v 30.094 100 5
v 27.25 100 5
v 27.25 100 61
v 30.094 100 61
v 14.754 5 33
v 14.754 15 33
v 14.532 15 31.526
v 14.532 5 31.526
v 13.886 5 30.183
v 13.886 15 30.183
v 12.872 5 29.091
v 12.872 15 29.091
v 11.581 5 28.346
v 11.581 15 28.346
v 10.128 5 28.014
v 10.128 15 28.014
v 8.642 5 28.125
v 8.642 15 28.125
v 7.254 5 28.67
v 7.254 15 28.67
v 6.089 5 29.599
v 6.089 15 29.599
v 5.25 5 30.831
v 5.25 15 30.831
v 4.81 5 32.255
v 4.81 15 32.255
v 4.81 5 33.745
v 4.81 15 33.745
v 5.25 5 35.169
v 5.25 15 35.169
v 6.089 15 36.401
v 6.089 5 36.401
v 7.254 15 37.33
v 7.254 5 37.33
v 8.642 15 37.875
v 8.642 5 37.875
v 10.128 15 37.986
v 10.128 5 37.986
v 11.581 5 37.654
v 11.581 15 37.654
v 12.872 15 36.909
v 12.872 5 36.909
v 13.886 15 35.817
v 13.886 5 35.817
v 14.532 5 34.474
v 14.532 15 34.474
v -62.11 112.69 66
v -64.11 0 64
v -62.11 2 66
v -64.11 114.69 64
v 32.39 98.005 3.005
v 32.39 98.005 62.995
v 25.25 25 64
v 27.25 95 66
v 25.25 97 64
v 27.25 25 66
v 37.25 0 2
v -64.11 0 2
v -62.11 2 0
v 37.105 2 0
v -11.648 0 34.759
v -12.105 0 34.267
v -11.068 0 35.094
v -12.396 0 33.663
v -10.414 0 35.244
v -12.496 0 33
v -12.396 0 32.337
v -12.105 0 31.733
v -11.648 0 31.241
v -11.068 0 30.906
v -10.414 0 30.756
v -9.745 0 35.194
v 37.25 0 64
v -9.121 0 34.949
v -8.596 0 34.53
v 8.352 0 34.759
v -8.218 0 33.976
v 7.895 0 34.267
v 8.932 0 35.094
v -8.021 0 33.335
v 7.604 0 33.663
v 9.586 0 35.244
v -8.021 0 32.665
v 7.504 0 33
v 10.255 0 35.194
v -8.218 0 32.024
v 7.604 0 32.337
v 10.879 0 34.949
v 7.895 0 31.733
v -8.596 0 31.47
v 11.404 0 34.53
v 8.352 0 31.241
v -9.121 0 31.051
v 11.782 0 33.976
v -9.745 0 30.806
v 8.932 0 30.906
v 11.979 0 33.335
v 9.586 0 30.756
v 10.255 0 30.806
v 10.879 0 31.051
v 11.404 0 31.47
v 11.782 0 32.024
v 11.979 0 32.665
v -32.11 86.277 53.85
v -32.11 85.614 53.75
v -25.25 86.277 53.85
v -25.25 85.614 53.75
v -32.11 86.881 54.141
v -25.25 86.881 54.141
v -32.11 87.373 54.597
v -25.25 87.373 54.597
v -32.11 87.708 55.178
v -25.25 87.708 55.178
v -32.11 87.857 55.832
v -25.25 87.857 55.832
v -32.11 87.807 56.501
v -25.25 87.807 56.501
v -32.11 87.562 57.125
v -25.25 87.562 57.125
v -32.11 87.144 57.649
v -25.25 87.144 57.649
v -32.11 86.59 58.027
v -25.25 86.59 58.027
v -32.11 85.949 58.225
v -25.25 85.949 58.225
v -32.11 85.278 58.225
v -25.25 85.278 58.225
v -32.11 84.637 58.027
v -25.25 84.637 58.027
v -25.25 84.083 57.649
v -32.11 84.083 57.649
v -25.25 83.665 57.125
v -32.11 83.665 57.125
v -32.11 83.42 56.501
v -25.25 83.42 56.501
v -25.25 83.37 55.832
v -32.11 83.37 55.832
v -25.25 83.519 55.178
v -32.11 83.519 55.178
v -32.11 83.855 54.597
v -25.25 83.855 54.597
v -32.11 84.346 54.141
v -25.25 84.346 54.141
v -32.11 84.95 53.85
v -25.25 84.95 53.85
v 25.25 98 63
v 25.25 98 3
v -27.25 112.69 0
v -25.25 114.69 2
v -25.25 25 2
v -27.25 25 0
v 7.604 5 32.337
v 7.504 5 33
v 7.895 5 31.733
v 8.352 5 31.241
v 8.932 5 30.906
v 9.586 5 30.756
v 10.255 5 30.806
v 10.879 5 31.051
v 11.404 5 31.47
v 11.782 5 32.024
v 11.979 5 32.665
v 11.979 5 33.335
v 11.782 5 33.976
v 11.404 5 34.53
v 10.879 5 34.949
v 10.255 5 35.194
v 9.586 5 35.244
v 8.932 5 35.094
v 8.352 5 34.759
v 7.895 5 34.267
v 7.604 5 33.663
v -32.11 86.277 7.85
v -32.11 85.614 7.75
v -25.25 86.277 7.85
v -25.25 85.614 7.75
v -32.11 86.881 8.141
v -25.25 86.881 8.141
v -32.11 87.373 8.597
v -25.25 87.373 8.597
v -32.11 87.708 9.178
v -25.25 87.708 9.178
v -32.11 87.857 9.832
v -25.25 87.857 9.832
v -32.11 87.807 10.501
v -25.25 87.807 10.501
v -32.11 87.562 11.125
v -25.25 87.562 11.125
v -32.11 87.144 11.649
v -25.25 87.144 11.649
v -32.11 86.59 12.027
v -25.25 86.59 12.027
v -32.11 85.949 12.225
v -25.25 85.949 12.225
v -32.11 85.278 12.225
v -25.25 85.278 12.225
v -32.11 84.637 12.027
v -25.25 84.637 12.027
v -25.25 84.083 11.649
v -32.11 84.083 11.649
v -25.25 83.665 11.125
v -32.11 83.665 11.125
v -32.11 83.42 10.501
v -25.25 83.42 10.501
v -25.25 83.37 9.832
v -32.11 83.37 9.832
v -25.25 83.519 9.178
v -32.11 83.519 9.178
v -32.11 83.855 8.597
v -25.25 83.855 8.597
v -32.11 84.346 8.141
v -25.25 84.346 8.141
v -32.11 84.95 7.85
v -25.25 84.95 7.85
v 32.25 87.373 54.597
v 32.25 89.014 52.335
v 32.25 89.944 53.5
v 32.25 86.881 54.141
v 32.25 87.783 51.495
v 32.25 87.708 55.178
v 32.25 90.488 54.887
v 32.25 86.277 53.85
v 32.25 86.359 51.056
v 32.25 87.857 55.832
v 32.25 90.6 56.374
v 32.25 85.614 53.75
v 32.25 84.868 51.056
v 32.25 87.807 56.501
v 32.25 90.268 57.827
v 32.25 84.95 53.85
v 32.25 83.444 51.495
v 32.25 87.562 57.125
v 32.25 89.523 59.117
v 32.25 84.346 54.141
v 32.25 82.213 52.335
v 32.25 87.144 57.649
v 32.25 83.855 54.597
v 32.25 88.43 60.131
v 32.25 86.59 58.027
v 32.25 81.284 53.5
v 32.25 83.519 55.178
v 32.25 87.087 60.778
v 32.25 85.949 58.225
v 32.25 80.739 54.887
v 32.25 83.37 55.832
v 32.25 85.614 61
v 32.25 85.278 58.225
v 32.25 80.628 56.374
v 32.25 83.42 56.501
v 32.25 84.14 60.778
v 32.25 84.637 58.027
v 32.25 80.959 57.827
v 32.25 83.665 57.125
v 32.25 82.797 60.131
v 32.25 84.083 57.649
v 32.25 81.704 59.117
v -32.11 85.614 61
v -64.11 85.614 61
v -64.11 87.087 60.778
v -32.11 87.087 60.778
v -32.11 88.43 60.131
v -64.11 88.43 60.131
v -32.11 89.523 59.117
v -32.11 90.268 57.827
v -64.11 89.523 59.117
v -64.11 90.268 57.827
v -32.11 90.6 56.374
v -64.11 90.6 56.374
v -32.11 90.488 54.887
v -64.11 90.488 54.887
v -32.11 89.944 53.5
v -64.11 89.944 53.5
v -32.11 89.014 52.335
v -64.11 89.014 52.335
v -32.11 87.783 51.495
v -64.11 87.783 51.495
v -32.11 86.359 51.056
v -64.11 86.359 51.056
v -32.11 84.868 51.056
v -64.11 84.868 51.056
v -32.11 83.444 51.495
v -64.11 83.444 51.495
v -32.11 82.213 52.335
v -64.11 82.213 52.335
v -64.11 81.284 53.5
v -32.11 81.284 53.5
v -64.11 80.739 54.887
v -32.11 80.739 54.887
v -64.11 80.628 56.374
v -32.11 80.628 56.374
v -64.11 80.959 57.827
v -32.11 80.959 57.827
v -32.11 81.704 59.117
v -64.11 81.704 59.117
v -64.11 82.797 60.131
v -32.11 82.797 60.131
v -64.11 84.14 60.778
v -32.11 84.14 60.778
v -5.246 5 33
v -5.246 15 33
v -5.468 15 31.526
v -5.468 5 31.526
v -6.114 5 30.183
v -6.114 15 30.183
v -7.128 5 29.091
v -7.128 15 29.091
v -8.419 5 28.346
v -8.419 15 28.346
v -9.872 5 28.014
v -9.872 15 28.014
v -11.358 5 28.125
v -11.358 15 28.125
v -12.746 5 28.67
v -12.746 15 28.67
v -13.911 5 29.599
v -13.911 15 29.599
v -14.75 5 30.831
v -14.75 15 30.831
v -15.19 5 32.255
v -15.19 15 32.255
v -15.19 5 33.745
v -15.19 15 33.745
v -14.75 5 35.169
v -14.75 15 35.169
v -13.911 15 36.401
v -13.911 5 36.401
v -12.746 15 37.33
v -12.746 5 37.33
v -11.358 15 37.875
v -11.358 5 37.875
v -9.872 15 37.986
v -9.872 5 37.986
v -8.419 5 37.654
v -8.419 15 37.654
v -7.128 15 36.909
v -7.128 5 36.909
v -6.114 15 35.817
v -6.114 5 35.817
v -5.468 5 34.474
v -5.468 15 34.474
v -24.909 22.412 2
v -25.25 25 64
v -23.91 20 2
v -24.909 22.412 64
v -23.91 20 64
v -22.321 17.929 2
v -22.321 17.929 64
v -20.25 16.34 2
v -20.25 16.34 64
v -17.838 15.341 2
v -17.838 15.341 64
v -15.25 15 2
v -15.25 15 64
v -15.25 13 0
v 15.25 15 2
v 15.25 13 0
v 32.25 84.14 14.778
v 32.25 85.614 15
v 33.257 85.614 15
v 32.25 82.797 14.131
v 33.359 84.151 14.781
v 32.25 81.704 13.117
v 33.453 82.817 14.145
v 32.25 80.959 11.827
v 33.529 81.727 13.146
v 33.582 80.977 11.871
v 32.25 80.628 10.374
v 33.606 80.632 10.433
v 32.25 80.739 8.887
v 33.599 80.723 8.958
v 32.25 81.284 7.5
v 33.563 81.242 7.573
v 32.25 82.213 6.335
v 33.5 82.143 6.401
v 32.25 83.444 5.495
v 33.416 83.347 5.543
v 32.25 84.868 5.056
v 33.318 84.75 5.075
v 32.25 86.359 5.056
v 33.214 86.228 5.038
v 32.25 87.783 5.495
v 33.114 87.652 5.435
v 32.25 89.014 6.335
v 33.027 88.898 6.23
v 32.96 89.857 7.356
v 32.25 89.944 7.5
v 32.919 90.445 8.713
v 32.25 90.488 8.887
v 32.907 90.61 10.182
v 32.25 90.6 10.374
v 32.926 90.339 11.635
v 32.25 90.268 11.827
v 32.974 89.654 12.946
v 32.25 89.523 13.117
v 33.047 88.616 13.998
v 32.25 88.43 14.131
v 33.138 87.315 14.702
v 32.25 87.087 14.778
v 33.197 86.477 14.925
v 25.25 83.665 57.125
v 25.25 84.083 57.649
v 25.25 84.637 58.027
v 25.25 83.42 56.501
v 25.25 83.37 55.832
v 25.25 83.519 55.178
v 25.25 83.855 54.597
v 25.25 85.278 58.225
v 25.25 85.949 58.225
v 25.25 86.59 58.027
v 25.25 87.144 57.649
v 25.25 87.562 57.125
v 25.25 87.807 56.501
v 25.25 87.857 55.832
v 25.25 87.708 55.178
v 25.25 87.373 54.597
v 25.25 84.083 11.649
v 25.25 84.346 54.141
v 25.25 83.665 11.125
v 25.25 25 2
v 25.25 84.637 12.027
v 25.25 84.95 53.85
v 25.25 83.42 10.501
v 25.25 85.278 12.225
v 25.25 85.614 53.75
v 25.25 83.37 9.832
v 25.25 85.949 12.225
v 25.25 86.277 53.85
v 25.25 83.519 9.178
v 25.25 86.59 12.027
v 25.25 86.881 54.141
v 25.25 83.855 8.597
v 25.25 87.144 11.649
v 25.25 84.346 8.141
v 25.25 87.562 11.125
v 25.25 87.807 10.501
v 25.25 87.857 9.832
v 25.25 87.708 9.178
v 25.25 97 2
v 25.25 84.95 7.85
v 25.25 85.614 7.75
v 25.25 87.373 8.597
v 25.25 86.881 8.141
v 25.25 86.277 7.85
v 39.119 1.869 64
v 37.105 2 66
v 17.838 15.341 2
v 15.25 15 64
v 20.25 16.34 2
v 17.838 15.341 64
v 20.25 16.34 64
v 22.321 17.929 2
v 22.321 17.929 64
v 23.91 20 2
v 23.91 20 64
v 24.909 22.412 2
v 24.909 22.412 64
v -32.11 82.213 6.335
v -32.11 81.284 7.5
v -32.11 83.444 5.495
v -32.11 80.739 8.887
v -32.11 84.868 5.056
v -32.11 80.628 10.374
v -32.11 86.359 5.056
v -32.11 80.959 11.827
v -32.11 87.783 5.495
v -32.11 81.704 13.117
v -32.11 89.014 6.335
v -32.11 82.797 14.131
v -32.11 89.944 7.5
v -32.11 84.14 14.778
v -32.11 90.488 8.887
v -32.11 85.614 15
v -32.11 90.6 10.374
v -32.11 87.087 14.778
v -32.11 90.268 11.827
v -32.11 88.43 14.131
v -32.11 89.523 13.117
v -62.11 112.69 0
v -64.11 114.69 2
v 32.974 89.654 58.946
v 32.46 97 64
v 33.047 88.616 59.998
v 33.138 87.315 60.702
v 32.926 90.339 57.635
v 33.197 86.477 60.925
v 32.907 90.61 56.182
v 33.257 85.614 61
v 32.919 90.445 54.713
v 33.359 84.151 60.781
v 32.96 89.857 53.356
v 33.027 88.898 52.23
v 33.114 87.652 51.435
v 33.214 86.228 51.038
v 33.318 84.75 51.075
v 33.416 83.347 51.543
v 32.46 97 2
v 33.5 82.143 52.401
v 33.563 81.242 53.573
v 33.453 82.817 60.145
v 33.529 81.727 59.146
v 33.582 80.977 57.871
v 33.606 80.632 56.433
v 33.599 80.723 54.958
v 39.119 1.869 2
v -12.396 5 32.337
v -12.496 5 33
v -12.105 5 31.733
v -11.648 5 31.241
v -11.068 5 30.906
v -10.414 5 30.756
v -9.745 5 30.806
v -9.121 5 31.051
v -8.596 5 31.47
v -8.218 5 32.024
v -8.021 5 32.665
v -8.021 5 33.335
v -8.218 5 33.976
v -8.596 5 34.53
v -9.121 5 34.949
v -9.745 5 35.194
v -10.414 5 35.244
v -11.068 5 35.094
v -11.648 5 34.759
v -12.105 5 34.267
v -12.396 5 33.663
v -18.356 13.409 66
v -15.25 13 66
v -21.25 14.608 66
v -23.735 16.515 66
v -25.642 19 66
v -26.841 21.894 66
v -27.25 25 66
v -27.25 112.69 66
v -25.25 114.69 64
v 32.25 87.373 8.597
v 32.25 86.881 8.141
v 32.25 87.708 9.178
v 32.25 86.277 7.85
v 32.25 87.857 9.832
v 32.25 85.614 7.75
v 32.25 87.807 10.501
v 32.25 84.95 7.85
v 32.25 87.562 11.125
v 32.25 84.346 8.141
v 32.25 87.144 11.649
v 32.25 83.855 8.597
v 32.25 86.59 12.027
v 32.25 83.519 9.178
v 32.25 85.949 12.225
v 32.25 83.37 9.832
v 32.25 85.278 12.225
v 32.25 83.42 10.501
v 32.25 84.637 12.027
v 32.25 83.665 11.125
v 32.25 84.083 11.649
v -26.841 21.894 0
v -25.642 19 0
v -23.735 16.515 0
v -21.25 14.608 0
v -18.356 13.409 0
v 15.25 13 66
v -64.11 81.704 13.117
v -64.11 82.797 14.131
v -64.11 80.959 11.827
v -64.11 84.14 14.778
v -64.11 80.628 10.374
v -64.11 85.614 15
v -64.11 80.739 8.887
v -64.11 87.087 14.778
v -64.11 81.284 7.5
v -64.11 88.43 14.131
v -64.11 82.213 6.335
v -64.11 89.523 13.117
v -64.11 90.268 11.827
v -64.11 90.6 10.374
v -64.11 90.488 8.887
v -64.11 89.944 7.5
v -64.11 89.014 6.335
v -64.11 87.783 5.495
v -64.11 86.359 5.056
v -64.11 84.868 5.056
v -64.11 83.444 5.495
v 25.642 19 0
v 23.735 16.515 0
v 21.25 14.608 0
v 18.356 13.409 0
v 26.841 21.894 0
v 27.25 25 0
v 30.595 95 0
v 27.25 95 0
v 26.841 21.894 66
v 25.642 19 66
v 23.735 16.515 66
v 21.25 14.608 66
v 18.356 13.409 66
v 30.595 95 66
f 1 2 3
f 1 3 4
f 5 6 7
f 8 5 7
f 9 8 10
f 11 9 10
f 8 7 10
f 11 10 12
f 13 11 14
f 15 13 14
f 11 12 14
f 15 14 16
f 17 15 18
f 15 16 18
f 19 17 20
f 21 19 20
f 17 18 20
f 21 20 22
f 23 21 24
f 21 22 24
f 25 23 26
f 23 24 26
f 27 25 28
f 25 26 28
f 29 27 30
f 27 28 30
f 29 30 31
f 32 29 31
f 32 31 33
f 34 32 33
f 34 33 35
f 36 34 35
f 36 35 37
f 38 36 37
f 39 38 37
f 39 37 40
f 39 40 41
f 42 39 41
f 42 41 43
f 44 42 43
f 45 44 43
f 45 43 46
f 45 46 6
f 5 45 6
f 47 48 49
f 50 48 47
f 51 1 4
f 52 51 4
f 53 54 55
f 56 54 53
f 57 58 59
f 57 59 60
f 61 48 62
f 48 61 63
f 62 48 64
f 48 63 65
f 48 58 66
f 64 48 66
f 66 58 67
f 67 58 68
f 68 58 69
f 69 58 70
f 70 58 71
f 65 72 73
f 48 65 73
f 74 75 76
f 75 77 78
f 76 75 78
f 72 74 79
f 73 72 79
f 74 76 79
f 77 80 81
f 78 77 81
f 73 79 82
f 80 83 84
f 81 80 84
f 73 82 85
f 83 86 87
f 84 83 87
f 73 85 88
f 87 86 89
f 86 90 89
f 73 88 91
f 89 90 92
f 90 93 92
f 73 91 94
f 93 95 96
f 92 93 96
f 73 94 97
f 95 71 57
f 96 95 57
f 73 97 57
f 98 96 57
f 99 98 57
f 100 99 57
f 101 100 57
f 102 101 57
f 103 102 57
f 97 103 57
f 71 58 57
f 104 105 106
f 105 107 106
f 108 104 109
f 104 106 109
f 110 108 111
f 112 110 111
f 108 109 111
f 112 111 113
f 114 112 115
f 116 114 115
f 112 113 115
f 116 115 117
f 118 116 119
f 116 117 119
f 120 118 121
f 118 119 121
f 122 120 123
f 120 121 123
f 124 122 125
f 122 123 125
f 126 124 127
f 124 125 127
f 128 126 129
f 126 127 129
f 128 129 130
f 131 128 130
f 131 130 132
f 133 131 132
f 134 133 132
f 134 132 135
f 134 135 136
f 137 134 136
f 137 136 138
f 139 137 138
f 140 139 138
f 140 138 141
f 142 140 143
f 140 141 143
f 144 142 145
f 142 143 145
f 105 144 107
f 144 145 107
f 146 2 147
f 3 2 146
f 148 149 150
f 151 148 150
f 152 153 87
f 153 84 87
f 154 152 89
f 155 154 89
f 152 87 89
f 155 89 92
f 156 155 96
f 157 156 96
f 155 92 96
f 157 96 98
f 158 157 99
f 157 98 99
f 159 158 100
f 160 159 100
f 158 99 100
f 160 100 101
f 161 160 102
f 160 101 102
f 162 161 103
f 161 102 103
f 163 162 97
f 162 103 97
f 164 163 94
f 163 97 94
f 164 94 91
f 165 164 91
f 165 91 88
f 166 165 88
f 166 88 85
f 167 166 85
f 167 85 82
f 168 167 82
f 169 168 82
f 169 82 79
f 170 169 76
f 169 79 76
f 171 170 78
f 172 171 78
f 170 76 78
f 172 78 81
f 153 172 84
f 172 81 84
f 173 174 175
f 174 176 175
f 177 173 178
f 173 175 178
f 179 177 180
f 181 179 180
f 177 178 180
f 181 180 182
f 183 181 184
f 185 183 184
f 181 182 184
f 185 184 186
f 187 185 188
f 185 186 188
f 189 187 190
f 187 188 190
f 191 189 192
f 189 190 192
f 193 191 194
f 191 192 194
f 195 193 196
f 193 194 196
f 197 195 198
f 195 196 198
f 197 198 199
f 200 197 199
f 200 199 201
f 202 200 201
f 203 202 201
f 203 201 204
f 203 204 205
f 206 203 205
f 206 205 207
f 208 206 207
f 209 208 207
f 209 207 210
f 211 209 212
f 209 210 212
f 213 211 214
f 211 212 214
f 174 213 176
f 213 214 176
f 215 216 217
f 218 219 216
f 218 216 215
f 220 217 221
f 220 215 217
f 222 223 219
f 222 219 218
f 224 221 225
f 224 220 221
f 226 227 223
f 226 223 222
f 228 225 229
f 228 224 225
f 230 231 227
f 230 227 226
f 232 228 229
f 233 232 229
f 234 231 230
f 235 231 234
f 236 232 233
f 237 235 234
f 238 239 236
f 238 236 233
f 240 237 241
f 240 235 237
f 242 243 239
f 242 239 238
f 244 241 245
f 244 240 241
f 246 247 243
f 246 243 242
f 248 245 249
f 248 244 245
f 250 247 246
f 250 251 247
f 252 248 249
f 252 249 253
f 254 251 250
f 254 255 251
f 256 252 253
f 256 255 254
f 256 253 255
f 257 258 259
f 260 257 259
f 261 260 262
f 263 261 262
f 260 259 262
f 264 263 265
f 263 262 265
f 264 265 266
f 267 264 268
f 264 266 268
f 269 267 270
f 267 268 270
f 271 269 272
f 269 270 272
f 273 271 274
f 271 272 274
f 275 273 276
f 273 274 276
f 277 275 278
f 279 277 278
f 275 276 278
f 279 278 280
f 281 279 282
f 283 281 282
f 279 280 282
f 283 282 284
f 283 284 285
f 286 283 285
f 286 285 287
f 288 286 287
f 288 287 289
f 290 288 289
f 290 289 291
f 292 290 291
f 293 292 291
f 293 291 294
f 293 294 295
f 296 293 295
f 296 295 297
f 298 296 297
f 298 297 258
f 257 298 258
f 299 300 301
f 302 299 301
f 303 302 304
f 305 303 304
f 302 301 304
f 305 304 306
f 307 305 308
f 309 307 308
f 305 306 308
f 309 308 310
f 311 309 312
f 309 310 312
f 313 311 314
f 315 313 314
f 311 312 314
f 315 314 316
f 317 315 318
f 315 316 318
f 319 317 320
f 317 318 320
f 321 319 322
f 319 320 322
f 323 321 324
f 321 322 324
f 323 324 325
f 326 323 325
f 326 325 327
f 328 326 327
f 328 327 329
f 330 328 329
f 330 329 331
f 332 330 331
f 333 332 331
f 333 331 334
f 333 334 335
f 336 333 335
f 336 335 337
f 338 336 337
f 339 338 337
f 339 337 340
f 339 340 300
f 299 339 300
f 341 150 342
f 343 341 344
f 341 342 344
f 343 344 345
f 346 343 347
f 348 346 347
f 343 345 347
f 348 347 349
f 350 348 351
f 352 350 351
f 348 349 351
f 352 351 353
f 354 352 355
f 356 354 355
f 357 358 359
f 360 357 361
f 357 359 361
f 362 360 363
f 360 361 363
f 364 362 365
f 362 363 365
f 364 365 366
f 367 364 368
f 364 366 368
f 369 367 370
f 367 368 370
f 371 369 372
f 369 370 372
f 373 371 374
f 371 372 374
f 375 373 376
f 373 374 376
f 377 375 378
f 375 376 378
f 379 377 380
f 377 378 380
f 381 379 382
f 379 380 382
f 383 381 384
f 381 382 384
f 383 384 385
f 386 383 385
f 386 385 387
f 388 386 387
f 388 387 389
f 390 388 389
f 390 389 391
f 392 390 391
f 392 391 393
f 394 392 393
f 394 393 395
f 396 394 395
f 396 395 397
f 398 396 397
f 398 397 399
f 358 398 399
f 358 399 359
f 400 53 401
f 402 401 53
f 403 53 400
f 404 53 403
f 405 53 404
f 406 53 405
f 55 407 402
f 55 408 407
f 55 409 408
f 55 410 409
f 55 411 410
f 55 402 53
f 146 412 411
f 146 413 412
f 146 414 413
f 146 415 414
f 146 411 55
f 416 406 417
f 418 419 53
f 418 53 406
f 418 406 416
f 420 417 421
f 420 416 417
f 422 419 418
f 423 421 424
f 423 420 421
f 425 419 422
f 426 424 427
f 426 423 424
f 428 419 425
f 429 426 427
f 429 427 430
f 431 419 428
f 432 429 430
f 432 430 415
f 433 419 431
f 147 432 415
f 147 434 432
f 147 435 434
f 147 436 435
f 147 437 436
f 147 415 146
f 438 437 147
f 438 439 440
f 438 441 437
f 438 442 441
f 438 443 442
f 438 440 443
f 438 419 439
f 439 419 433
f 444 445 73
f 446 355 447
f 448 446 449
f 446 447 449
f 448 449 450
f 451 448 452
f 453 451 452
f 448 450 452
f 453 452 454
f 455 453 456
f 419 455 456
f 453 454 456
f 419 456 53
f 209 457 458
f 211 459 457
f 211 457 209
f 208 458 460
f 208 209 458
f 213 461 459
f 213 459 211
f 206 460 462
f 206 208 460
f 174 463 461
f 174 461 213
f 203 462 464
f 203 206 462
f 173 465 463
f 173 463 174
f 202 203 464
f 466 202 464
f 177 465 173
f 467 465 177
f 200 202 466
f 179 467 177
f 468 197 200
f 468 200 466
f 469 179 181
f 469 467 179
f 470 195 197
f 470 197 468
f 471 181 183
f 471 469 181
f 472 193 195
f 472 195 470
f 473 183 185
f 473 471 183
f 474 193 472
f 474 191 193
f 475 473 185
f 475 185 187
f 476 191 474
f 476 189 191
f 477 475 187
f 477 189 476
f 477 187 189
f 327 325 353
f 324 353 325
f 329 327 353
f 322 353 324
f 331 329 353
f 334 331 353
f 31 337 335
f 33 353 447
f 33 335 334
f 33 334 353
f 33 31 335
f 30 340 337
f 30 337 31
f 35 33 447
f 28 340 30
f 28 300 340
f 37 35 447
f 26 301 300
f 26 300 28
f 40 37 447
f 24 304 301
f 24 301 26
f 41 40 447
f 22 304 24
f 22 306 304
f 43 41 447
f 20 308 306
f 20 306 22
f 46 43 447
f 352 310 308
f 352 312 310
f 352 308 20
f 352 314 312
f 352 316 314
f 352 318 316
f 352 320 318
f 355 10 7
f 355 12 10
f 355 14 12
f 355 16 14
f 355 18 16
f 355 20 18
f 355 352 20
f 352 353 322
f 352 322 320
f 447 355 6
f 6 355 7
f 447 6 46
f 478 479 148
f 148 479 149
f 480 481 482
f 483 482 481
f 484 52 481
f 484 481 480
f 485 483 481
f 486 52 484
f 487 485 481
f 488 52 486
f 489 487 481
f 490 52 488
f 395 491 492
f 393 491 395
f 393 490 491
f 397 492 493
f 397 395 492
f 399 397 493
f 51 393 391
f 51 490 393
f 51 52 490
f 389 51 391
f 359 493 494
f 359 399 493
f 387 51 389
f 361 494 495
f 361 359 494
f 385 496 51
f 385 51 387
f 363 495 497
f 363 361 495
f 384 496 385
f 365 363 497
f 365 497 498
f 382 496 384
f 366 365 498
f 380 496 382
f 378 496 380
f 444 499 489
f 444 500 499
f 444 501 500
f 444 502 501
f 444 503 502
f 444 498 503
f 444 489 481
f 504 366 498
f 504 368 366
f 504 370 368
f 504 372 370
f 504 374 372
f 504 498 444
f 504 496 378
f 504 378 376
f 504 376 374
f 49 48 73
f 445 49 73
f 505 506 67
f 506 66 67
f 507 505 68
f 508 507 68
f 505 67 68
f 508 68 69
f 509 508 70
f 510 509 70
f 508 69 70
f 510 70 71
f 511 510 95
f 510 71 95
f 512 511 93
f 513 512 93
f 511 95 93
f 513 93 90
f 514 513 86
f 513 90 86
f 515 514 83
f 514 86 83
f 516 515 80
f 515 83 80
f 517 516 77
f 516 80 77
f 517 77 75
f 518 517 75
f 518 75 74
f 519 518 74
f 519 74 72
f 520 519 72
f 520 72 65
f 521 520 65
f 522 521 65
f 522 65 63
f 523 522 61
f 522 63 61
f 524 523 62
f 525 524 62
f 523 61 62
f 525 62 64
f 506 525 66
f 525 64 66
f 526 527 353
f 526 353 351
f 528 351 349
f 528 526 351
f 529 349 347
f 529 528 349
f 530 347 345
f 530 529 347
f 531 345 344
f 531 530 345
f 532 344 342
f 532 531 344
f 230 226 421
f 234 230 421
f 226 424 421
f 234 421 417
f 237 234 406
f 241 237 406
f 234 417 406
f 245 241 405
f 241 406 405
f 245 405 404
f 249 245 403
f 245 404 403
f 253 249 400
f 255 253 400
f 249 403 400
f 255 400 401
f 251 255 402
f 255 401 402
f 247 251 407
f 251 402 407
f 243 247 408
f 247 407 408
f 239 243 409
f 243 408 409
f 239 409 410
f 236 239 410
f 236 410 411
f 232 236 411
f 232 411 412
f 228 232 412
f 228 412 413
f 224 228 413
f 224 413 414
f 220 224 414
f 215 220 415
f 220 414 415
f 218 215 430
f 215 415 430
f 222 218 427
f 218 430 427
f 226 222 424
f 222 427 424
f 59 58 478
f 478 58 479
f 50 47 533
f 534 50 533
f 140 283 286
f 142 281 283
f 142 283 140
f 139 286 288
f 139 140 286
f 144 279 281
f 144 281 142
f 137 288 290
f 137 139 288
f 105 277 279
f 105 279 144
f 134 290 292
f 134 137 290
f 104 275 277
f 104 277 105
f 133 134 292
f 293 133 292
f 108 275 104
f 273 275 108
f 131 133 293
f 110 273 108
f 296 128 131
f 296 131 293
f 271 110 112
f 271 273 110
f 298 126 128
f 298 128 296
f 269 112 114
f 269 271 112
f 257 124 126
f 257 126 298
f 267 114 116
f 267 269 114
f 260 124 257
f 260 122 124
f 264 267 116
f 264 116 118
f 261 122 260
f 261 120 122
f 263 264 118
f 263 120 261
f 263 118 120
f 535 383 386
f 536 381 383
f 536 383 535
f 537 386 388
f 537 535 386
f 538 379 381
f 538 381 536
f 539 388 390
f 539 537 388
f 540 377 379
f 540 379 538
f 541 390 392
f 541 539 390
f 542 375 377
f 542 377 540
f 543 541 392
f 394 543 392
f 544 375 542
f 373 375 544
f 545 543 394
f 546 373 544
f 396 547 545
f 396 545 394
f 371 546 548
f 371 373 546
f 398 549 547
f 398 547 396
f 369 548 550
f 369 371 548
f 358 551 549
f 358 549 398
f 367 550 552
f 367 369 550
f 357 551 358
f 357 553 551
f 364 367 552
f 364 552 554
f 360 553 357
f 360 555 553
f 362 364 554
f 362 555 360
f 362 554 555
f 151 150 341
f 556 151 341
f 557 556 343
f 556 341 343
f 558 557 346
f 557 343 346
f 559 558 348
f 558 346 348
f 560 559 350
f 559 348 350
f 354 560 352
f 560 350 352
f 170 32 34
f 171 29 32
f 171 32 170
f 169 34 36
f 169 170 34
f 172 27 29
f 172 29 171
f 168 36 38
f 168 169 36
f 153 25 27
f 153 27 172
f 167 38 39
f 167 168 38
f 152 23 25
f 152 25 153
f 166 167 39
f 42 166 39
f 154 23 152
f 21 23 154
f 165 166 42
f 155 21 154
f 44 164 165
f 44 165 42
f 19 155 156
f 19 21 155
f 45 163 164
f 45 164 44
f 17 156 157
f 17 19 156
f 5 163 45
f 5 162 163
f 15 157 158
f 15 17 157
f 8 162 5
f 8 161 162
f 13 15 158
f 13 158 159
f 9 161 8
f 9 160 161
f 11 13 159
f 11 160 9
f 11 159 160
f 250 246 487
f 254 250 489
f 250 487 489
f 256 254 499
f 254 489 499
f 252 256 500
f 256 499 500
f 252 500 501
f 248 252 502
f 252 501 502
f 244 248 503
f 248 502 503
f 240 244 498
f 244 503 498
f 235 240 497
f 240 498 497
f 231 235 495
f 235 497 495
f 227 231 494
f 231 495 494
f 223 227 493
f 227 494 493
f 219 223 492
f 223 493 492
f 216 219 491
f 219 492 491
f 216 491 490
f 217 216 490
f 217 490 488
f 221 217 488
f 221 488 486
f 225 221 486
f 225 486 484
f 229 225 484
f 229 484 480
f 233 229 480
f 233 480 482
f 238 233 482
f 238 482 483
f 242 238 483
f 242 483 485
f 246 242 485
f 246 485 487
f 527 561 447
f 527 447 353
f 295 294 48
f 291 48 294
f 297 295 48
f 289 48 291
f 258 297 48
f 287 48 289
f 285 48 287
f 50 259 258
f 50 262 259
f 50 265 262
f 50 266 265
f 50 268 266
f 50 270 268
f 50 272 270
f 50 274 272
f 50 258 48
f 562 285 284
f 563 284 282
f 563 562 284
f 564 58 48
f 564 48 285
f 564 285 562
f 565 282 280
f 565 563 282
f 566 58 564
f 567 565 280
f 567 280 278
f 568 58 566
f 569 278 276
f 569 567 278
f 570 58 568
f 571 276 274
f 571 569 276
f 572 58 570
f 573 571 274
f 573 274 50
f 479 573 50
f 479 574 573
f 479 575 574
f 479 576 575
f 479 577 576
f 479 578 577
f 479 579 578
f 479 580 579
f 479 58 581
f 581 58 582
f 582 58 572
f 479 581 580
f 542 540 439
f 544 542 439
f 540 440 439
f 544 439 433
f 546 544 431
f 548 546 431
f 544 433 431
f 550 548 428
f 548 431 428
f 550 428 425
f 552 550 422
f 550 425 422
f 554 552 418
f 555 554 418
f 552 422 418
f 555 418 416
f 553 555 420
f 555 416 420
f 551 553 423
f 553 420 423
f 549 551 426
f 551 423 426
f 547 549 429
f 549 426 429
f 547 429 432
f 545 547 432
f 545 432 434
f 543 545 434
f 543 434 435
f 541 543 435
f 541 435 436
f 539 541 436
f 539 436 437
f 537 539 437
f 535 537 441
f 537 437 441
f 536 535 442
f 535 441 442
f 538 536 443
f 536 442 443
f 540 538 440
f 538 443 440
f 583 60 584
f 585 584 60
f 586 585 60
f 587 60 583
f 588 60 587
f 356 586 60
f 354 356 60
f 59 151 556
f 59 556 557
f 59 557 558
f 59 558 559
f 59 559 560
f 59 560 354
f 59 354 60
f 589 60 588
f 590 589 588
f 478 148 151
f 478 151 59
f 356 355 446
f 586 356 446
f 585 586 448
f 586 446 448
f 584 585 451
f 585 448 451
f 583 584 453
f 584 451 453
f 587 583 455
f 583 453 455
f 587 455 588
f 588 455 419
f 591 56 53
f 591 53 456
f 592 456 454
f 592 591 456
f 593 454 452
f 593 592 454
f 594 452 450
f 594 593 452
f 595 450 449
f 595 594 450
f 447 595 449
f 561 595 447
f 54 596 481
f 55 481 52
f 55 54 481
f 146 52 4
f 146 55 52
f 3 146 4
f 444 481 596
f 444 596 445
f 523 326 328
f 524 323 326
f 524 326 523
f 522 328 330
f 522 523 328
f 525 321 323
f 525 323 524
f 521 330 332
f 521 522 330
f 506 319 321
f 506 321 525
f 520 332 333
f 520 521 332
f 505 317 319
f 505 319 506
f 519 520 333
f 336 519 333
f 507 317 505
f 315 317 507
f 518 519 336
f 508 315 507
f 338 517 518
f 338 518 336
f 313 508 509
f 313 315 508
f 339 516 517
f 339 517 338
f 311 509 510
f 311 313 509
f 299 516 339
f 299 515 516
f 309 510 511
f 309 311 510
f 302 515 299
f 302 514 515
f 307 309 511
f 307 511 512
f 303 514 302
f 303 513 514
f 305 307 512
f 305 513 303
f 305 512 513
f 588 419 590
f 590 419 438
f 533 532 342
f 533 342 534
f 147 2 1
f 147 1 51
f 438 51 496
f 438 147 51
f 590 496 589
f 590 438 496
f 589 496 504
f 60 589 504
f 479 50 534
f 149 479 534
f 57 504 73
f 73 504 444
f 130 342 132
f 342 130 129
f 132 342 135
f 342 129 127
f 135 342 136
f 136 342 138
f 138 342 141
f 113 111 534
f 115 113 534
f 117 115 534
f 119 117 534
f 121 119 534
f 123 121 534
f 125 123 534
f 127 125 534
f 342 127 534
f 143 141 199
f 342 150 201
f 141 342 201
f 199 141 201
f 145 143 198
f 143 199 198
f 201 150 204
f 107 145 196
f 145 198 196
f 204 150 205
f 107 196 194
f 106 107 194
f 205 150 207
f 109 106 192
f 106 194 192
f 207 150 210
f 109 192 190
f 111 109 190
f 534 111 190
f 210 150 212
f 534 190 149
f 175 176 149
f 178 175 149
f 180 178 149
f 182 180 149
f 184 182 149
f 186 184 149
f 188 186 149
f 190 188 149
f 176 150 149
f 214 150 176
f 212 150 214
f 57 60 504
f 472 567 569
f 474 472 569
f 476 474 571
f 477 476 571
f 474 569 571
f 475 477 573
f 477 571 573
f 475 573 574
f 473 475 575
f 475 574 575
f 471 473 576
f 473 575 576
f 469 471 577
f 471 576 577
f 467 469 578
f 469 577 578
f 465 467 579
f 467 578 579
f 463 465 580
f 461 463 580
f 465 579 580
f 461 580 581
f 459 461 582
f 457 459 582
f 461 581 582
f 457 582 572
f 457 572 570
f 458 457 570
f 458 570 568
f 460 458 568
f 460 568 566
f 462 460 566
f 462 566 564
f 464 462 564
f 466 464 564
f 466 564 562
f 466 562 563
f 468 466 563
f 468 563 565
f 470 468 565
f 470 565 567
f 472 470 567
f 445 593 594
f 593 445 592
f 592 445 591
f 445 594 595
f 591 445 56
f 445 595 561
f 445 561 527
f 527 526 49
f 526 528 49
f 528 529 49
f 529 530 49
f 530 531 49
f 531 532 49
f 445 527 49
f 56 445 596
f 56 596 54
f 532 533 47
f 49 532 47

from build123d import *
from OCP.BRepFilletAPI import BRepFilletAPI_MakeChamfer

# Parameters (mm, degrees)
ESTRUSIONE_ESTRUSIONE1_DEPTH                         = 66
RACCORDO1_R                                          = 10
SMUSSO1_SIZE                                         = 2
SMUSSO1_SIZE2                                        = 2.155800013
SMUSSO1_SIZE2_2                                      = 1.873732722
SMUSSO2_SIZE                                         = 5
FORO_LAMATO_PER_VITE_M4_A_TESTA_CILINDRI_D           = 4.5
FORO_LAMATO_PER_VITE_M4_A_TESTA_CILINDRI_DEPTH       = 30
FORO_LAMATO_PER_VITE_M4_A_TESTA_CILINDRI_CBORE_D     = 10
FORO_LAMATO_PER_VITE_M4_A_TESTA_CILINDRI_CBORE_DEPTH = 3
FORO_LAMATO_PER_VITE_M4_A_TESTA_CILINDRI_TIP         = 1.351936393
FORO_LAMATO_PER_VITE_M4_A_TESTA_CILI_2_D             = 4.5
FORO_LAMATO_PER_VITE_M4_A_TESTA_CILI_2_DEPTH         = 30
FORO_LAMATO_PER_VITE_M4_A_TESTA_CILI_2_CBORE_D       = 10
FORO_LAMATO_PER_VITE_M4_A_TESTA_CILI_2_CBORE_DEPTH   = 10
FORO_LAMATO_PER_VITE_M4_A_TESTA_CILI_2_TIP           = 1.351936393
FORO_LAMATO_PER_VITE_M4_A_TESTA_CILI_3_D             = 4.5
FORO_LAMATO_PER_VITE_M4_A_TESTA_CILI_3_DEPTH         = 45
FORO_LAMATO_PER_VITE_M4_A_TESTA_CILI_3_CBORE_D       = 10
FORO_LAMATO_PER_VITE_M4_A_TESTA_CILI_3_CBORE_DEPTH   = 32
FORO_LAMATO_PER_VITE_M4_A_TESTA_CILI_3_TIP           = 1.351936393


with BuildPart() as part:
    # Schizzo1 → Estrusione-Estrusione1 (new body)
    with BuildSketch(Plane.XY):
        Polygon((25.25, 100), (32.25, 100), (39.25, 0), (-39.25, 0), (-64.110342, 0), (-64.110342, 114.69), (-25.25, 114.69), (-25.25, 100), (-25.25, 15), (25.25, 15), align=None)
    extrude(amount=ESTRUSIONE_ESTRUSIONE1_DEPTH)

    # Raccordo1
    raccordo1_edges = [part.edges().sort_by_distance(p)[0] for p in [
        (-25.25, 15, 33),
        (25.25, 15, 33),
    ]]
    fillet(raccordo1_edges, radius=RACCORDO1_R)

    # Smusso1: one chamfer whose edges measure the first distance from different faces: ONE call of the kernel's chamfer builder (chamfer() names one face for all edges)
    smusso1_edges_1 = [part.edges().sort_by_distance(p)[0] for p in [
        (35.75, 50, 0),
        (-12.430171, 0, 0),
        (-64.110342, 57.345, 0),
        (-44.680171, 114.69, 0),
        (25.25, 62.5, 0),
        (25.25, 100, 33),
        (-44.680171, 114.69, 66),
        (-64.110342, 57.345, 66),
        (-12.430171, 0, 66),
        (-25.25, 69.845, 0),
        (-25.25, 69.845, 66),
        (0, 15, 0),
        (0, 15, 66),
        (-22.321067812, 17.928932188, 0),
        (-22.321067812, 17.928932188, 66),
        (35.75, 50, 66),
        (22.321067812, 17.928932188, 0),
        (22.321067812, 17.928932188, 66),
        (25.25, 62.5, 66),
    ]]
    smusso1_edges_2 = [part.edges().sort_by_distance(p)[0] for p in [
        (32.25, 100, 33),
    ]]
    smusso1_side_2 = [part.faces().sort_by_distance(p)[0] for p in [
        (35.75, 50, 33),
    ]]
    smusso1_edges_3 = [part.edges().sort_by_distance(p)[0] for p in [
        (39.25, 0, 33),
    ]]
    smusso1_side_3 = [part.faces().sort_by_distance(p)[0] for p in [
        (-12.430171, 0, 33),
    ]]
    smusso1 = BRepFilletAPI_MakeChamfer(part.part.solid().wrapped)
    for e in smusso1_edges_1:
        smusso1.Add(SMUSSO1_SIZE, e.wrapped)
    for e in smusso1_edges_2:
        smusso1.Add(SMUSSO1_SIZE, SMUSSO1_SIZE2, e.wrapped, smusso1_side_2[0].wrapped)  # the first distance lies on this face
    for e in smusso1_edges_3:
        smusso1.Add(SMUSSO1_SIZE, SMUSSO1_SIZE2_2, e.wrapped, smusso1_side_3[0].wrapped)  # the first distance lies on this face
    add(Compound.cast(smusso1.Shape()), mode=Mode.REPLACE)

    # Smusso2
    # the kernel refuses this chamfer: 5 mm, written as the material it takes off along each edge
    with BuildSketch(Plane(origin=(14.39158506, 100, 66), x_dir=(2.02935454733688e-15, -0.9996219169112968, 0.027495876610587663), z_dir=(1, 0, 0)), Plane(origin=(14.39158506, 100, 0), x_dir=(0, 0.0274958766105877, 0.9996219169112968), z_dir=(1, 0, 0))) as smusso2_piece_1:
        Polygon((SMUSSO2_SIZE * 0.999621916911, SMUSSO2_SIZE * 0.0274958766106), (-SMUSSO2_SIZE * 0.0274958766106, SMUSSO2_SIZE * 0.999621916911), (0, 0), align=None)
    extrude(amount=28.561029867, mode=Mode.SUBTRACT)

    # Foro lamato per Vite M4 a testa cilindri
    with Locations(Plane(origin=(35.25, 0, 0), x_dir=(0, 0, 1), z_dir=(1, 0, 0))):
        with Locations((56, -85.613628), (10, -85.613628)):
            CounterBoreHole(FORO_LAMATO_PER_VITE_M4_A_TESTA_CILINDRI_D / 2, FORO_LAMATO_PER_VITE_M4_A_TESTA_CILINDRI_CBORE_D / 2, FORO_LAMATO_PER_VITE_M4_A_TESTA_CILINDRI_CBORE_DEPTH, depth=FORO_LAMATO_PER_VITE_M4_A_TESTA_CILINDRI_DEPTH)
            with Locations((0, 0, -(FORO_LAMATO_PER_VITE_M4_A_TESTA_CILINDRI_DEPTH + FORO_LAMATO_PER_VITE_M4_A_TESTA_CILINDRI_TIP / 2))):  # 118° drill point
                Cone(0, FORO_LAMATO_PER_VITE_M4_A_TESTA_CILINDRI_D / 2, FORO_LAMATO_PER_VITE_M4_A_TESTA_CILINDRI_TIP, mode=Mode.SUBTRACT)

    # Foro lamato per Vite M4 a testa cili 2
    with Locations(Plane(origin=(0, 15, 0), x_dir=(1, 0, 0), z_dir=(0, 1, 0))):
        with Locations((-10.245584981, -33), (9.754415019, -33)):
            CounterBoreHole(FORO_LAMATO_PER_VITE_M4_A_TESTA_CILI_2_D / 2, FORO_LAMATO_PER_VITE_M4_A_TESTA_CILI_2_CBORE_D / 2, FORO_LAMATO_PER_VITE_M4_A_TESTA_CILI_2_CBORE_DEPTH, depth=FORO_LAMATO_PER_VITE_M4_A_TESTA_CILI_2_DEPTH)
            with Locations((0, 0, -(FORO_LAMATO_PER_VITE_M4_A_TESTA_CILI_2_DEPTH + FORO_LAMATO_PER_VITE_M4_A_TESTA_CILI_2_TIP / 2))):  # 118° drill point
                Cone(0, FORO_LAMATO_PER_VITE_M4_A_TESTA_CILI_2_D / 2, FORO_LAMATO_PER_VITE_M4_A_TESTA_CILI_2_TIP, mode=Mode.SUBTRACT)

    # Foro lamato per Vite M4 a testa cili 3
    with Locations(Plane.ZY.offset(64.110342)):
        with Locations((10, 85.613628), (56, 85.613628)):
            CounterBoreHole(FORO_LAMATO_PER_VITE_M4_A_TESTA_CILI_3_D / 2, FORO_LAMATO_PER_VITE_M4_A_TESTA_CILI_3_CBORE_D / 2, FORO_LAMATO_PER_VITE_M4_A_TESTA_CILI_3_CBORE_DEPTH, depth=FORO_LAMATO_PER_VITE_M4_A_TESTA_CILI_3_DEPTH)
            with Locations((0, 0, -(FORO_LAMATO_PER_VITE_M4_A_TESTA_CILI_3_DEPTH + FORO_LAMATO_PER_VITE_M4_A_TESTA_CILI_3_TIP / 2))):  # 118° drill point
                Cone(0, FORO_LAMATO_PER_VITE_M4_A_TESTA_CILI_3_D / 2, FORO_LAMATO_PER_VITE_M4_A_TESTA_CILI_3_TIP, mode=Mode.SUBTRACT)


solid = part.part
